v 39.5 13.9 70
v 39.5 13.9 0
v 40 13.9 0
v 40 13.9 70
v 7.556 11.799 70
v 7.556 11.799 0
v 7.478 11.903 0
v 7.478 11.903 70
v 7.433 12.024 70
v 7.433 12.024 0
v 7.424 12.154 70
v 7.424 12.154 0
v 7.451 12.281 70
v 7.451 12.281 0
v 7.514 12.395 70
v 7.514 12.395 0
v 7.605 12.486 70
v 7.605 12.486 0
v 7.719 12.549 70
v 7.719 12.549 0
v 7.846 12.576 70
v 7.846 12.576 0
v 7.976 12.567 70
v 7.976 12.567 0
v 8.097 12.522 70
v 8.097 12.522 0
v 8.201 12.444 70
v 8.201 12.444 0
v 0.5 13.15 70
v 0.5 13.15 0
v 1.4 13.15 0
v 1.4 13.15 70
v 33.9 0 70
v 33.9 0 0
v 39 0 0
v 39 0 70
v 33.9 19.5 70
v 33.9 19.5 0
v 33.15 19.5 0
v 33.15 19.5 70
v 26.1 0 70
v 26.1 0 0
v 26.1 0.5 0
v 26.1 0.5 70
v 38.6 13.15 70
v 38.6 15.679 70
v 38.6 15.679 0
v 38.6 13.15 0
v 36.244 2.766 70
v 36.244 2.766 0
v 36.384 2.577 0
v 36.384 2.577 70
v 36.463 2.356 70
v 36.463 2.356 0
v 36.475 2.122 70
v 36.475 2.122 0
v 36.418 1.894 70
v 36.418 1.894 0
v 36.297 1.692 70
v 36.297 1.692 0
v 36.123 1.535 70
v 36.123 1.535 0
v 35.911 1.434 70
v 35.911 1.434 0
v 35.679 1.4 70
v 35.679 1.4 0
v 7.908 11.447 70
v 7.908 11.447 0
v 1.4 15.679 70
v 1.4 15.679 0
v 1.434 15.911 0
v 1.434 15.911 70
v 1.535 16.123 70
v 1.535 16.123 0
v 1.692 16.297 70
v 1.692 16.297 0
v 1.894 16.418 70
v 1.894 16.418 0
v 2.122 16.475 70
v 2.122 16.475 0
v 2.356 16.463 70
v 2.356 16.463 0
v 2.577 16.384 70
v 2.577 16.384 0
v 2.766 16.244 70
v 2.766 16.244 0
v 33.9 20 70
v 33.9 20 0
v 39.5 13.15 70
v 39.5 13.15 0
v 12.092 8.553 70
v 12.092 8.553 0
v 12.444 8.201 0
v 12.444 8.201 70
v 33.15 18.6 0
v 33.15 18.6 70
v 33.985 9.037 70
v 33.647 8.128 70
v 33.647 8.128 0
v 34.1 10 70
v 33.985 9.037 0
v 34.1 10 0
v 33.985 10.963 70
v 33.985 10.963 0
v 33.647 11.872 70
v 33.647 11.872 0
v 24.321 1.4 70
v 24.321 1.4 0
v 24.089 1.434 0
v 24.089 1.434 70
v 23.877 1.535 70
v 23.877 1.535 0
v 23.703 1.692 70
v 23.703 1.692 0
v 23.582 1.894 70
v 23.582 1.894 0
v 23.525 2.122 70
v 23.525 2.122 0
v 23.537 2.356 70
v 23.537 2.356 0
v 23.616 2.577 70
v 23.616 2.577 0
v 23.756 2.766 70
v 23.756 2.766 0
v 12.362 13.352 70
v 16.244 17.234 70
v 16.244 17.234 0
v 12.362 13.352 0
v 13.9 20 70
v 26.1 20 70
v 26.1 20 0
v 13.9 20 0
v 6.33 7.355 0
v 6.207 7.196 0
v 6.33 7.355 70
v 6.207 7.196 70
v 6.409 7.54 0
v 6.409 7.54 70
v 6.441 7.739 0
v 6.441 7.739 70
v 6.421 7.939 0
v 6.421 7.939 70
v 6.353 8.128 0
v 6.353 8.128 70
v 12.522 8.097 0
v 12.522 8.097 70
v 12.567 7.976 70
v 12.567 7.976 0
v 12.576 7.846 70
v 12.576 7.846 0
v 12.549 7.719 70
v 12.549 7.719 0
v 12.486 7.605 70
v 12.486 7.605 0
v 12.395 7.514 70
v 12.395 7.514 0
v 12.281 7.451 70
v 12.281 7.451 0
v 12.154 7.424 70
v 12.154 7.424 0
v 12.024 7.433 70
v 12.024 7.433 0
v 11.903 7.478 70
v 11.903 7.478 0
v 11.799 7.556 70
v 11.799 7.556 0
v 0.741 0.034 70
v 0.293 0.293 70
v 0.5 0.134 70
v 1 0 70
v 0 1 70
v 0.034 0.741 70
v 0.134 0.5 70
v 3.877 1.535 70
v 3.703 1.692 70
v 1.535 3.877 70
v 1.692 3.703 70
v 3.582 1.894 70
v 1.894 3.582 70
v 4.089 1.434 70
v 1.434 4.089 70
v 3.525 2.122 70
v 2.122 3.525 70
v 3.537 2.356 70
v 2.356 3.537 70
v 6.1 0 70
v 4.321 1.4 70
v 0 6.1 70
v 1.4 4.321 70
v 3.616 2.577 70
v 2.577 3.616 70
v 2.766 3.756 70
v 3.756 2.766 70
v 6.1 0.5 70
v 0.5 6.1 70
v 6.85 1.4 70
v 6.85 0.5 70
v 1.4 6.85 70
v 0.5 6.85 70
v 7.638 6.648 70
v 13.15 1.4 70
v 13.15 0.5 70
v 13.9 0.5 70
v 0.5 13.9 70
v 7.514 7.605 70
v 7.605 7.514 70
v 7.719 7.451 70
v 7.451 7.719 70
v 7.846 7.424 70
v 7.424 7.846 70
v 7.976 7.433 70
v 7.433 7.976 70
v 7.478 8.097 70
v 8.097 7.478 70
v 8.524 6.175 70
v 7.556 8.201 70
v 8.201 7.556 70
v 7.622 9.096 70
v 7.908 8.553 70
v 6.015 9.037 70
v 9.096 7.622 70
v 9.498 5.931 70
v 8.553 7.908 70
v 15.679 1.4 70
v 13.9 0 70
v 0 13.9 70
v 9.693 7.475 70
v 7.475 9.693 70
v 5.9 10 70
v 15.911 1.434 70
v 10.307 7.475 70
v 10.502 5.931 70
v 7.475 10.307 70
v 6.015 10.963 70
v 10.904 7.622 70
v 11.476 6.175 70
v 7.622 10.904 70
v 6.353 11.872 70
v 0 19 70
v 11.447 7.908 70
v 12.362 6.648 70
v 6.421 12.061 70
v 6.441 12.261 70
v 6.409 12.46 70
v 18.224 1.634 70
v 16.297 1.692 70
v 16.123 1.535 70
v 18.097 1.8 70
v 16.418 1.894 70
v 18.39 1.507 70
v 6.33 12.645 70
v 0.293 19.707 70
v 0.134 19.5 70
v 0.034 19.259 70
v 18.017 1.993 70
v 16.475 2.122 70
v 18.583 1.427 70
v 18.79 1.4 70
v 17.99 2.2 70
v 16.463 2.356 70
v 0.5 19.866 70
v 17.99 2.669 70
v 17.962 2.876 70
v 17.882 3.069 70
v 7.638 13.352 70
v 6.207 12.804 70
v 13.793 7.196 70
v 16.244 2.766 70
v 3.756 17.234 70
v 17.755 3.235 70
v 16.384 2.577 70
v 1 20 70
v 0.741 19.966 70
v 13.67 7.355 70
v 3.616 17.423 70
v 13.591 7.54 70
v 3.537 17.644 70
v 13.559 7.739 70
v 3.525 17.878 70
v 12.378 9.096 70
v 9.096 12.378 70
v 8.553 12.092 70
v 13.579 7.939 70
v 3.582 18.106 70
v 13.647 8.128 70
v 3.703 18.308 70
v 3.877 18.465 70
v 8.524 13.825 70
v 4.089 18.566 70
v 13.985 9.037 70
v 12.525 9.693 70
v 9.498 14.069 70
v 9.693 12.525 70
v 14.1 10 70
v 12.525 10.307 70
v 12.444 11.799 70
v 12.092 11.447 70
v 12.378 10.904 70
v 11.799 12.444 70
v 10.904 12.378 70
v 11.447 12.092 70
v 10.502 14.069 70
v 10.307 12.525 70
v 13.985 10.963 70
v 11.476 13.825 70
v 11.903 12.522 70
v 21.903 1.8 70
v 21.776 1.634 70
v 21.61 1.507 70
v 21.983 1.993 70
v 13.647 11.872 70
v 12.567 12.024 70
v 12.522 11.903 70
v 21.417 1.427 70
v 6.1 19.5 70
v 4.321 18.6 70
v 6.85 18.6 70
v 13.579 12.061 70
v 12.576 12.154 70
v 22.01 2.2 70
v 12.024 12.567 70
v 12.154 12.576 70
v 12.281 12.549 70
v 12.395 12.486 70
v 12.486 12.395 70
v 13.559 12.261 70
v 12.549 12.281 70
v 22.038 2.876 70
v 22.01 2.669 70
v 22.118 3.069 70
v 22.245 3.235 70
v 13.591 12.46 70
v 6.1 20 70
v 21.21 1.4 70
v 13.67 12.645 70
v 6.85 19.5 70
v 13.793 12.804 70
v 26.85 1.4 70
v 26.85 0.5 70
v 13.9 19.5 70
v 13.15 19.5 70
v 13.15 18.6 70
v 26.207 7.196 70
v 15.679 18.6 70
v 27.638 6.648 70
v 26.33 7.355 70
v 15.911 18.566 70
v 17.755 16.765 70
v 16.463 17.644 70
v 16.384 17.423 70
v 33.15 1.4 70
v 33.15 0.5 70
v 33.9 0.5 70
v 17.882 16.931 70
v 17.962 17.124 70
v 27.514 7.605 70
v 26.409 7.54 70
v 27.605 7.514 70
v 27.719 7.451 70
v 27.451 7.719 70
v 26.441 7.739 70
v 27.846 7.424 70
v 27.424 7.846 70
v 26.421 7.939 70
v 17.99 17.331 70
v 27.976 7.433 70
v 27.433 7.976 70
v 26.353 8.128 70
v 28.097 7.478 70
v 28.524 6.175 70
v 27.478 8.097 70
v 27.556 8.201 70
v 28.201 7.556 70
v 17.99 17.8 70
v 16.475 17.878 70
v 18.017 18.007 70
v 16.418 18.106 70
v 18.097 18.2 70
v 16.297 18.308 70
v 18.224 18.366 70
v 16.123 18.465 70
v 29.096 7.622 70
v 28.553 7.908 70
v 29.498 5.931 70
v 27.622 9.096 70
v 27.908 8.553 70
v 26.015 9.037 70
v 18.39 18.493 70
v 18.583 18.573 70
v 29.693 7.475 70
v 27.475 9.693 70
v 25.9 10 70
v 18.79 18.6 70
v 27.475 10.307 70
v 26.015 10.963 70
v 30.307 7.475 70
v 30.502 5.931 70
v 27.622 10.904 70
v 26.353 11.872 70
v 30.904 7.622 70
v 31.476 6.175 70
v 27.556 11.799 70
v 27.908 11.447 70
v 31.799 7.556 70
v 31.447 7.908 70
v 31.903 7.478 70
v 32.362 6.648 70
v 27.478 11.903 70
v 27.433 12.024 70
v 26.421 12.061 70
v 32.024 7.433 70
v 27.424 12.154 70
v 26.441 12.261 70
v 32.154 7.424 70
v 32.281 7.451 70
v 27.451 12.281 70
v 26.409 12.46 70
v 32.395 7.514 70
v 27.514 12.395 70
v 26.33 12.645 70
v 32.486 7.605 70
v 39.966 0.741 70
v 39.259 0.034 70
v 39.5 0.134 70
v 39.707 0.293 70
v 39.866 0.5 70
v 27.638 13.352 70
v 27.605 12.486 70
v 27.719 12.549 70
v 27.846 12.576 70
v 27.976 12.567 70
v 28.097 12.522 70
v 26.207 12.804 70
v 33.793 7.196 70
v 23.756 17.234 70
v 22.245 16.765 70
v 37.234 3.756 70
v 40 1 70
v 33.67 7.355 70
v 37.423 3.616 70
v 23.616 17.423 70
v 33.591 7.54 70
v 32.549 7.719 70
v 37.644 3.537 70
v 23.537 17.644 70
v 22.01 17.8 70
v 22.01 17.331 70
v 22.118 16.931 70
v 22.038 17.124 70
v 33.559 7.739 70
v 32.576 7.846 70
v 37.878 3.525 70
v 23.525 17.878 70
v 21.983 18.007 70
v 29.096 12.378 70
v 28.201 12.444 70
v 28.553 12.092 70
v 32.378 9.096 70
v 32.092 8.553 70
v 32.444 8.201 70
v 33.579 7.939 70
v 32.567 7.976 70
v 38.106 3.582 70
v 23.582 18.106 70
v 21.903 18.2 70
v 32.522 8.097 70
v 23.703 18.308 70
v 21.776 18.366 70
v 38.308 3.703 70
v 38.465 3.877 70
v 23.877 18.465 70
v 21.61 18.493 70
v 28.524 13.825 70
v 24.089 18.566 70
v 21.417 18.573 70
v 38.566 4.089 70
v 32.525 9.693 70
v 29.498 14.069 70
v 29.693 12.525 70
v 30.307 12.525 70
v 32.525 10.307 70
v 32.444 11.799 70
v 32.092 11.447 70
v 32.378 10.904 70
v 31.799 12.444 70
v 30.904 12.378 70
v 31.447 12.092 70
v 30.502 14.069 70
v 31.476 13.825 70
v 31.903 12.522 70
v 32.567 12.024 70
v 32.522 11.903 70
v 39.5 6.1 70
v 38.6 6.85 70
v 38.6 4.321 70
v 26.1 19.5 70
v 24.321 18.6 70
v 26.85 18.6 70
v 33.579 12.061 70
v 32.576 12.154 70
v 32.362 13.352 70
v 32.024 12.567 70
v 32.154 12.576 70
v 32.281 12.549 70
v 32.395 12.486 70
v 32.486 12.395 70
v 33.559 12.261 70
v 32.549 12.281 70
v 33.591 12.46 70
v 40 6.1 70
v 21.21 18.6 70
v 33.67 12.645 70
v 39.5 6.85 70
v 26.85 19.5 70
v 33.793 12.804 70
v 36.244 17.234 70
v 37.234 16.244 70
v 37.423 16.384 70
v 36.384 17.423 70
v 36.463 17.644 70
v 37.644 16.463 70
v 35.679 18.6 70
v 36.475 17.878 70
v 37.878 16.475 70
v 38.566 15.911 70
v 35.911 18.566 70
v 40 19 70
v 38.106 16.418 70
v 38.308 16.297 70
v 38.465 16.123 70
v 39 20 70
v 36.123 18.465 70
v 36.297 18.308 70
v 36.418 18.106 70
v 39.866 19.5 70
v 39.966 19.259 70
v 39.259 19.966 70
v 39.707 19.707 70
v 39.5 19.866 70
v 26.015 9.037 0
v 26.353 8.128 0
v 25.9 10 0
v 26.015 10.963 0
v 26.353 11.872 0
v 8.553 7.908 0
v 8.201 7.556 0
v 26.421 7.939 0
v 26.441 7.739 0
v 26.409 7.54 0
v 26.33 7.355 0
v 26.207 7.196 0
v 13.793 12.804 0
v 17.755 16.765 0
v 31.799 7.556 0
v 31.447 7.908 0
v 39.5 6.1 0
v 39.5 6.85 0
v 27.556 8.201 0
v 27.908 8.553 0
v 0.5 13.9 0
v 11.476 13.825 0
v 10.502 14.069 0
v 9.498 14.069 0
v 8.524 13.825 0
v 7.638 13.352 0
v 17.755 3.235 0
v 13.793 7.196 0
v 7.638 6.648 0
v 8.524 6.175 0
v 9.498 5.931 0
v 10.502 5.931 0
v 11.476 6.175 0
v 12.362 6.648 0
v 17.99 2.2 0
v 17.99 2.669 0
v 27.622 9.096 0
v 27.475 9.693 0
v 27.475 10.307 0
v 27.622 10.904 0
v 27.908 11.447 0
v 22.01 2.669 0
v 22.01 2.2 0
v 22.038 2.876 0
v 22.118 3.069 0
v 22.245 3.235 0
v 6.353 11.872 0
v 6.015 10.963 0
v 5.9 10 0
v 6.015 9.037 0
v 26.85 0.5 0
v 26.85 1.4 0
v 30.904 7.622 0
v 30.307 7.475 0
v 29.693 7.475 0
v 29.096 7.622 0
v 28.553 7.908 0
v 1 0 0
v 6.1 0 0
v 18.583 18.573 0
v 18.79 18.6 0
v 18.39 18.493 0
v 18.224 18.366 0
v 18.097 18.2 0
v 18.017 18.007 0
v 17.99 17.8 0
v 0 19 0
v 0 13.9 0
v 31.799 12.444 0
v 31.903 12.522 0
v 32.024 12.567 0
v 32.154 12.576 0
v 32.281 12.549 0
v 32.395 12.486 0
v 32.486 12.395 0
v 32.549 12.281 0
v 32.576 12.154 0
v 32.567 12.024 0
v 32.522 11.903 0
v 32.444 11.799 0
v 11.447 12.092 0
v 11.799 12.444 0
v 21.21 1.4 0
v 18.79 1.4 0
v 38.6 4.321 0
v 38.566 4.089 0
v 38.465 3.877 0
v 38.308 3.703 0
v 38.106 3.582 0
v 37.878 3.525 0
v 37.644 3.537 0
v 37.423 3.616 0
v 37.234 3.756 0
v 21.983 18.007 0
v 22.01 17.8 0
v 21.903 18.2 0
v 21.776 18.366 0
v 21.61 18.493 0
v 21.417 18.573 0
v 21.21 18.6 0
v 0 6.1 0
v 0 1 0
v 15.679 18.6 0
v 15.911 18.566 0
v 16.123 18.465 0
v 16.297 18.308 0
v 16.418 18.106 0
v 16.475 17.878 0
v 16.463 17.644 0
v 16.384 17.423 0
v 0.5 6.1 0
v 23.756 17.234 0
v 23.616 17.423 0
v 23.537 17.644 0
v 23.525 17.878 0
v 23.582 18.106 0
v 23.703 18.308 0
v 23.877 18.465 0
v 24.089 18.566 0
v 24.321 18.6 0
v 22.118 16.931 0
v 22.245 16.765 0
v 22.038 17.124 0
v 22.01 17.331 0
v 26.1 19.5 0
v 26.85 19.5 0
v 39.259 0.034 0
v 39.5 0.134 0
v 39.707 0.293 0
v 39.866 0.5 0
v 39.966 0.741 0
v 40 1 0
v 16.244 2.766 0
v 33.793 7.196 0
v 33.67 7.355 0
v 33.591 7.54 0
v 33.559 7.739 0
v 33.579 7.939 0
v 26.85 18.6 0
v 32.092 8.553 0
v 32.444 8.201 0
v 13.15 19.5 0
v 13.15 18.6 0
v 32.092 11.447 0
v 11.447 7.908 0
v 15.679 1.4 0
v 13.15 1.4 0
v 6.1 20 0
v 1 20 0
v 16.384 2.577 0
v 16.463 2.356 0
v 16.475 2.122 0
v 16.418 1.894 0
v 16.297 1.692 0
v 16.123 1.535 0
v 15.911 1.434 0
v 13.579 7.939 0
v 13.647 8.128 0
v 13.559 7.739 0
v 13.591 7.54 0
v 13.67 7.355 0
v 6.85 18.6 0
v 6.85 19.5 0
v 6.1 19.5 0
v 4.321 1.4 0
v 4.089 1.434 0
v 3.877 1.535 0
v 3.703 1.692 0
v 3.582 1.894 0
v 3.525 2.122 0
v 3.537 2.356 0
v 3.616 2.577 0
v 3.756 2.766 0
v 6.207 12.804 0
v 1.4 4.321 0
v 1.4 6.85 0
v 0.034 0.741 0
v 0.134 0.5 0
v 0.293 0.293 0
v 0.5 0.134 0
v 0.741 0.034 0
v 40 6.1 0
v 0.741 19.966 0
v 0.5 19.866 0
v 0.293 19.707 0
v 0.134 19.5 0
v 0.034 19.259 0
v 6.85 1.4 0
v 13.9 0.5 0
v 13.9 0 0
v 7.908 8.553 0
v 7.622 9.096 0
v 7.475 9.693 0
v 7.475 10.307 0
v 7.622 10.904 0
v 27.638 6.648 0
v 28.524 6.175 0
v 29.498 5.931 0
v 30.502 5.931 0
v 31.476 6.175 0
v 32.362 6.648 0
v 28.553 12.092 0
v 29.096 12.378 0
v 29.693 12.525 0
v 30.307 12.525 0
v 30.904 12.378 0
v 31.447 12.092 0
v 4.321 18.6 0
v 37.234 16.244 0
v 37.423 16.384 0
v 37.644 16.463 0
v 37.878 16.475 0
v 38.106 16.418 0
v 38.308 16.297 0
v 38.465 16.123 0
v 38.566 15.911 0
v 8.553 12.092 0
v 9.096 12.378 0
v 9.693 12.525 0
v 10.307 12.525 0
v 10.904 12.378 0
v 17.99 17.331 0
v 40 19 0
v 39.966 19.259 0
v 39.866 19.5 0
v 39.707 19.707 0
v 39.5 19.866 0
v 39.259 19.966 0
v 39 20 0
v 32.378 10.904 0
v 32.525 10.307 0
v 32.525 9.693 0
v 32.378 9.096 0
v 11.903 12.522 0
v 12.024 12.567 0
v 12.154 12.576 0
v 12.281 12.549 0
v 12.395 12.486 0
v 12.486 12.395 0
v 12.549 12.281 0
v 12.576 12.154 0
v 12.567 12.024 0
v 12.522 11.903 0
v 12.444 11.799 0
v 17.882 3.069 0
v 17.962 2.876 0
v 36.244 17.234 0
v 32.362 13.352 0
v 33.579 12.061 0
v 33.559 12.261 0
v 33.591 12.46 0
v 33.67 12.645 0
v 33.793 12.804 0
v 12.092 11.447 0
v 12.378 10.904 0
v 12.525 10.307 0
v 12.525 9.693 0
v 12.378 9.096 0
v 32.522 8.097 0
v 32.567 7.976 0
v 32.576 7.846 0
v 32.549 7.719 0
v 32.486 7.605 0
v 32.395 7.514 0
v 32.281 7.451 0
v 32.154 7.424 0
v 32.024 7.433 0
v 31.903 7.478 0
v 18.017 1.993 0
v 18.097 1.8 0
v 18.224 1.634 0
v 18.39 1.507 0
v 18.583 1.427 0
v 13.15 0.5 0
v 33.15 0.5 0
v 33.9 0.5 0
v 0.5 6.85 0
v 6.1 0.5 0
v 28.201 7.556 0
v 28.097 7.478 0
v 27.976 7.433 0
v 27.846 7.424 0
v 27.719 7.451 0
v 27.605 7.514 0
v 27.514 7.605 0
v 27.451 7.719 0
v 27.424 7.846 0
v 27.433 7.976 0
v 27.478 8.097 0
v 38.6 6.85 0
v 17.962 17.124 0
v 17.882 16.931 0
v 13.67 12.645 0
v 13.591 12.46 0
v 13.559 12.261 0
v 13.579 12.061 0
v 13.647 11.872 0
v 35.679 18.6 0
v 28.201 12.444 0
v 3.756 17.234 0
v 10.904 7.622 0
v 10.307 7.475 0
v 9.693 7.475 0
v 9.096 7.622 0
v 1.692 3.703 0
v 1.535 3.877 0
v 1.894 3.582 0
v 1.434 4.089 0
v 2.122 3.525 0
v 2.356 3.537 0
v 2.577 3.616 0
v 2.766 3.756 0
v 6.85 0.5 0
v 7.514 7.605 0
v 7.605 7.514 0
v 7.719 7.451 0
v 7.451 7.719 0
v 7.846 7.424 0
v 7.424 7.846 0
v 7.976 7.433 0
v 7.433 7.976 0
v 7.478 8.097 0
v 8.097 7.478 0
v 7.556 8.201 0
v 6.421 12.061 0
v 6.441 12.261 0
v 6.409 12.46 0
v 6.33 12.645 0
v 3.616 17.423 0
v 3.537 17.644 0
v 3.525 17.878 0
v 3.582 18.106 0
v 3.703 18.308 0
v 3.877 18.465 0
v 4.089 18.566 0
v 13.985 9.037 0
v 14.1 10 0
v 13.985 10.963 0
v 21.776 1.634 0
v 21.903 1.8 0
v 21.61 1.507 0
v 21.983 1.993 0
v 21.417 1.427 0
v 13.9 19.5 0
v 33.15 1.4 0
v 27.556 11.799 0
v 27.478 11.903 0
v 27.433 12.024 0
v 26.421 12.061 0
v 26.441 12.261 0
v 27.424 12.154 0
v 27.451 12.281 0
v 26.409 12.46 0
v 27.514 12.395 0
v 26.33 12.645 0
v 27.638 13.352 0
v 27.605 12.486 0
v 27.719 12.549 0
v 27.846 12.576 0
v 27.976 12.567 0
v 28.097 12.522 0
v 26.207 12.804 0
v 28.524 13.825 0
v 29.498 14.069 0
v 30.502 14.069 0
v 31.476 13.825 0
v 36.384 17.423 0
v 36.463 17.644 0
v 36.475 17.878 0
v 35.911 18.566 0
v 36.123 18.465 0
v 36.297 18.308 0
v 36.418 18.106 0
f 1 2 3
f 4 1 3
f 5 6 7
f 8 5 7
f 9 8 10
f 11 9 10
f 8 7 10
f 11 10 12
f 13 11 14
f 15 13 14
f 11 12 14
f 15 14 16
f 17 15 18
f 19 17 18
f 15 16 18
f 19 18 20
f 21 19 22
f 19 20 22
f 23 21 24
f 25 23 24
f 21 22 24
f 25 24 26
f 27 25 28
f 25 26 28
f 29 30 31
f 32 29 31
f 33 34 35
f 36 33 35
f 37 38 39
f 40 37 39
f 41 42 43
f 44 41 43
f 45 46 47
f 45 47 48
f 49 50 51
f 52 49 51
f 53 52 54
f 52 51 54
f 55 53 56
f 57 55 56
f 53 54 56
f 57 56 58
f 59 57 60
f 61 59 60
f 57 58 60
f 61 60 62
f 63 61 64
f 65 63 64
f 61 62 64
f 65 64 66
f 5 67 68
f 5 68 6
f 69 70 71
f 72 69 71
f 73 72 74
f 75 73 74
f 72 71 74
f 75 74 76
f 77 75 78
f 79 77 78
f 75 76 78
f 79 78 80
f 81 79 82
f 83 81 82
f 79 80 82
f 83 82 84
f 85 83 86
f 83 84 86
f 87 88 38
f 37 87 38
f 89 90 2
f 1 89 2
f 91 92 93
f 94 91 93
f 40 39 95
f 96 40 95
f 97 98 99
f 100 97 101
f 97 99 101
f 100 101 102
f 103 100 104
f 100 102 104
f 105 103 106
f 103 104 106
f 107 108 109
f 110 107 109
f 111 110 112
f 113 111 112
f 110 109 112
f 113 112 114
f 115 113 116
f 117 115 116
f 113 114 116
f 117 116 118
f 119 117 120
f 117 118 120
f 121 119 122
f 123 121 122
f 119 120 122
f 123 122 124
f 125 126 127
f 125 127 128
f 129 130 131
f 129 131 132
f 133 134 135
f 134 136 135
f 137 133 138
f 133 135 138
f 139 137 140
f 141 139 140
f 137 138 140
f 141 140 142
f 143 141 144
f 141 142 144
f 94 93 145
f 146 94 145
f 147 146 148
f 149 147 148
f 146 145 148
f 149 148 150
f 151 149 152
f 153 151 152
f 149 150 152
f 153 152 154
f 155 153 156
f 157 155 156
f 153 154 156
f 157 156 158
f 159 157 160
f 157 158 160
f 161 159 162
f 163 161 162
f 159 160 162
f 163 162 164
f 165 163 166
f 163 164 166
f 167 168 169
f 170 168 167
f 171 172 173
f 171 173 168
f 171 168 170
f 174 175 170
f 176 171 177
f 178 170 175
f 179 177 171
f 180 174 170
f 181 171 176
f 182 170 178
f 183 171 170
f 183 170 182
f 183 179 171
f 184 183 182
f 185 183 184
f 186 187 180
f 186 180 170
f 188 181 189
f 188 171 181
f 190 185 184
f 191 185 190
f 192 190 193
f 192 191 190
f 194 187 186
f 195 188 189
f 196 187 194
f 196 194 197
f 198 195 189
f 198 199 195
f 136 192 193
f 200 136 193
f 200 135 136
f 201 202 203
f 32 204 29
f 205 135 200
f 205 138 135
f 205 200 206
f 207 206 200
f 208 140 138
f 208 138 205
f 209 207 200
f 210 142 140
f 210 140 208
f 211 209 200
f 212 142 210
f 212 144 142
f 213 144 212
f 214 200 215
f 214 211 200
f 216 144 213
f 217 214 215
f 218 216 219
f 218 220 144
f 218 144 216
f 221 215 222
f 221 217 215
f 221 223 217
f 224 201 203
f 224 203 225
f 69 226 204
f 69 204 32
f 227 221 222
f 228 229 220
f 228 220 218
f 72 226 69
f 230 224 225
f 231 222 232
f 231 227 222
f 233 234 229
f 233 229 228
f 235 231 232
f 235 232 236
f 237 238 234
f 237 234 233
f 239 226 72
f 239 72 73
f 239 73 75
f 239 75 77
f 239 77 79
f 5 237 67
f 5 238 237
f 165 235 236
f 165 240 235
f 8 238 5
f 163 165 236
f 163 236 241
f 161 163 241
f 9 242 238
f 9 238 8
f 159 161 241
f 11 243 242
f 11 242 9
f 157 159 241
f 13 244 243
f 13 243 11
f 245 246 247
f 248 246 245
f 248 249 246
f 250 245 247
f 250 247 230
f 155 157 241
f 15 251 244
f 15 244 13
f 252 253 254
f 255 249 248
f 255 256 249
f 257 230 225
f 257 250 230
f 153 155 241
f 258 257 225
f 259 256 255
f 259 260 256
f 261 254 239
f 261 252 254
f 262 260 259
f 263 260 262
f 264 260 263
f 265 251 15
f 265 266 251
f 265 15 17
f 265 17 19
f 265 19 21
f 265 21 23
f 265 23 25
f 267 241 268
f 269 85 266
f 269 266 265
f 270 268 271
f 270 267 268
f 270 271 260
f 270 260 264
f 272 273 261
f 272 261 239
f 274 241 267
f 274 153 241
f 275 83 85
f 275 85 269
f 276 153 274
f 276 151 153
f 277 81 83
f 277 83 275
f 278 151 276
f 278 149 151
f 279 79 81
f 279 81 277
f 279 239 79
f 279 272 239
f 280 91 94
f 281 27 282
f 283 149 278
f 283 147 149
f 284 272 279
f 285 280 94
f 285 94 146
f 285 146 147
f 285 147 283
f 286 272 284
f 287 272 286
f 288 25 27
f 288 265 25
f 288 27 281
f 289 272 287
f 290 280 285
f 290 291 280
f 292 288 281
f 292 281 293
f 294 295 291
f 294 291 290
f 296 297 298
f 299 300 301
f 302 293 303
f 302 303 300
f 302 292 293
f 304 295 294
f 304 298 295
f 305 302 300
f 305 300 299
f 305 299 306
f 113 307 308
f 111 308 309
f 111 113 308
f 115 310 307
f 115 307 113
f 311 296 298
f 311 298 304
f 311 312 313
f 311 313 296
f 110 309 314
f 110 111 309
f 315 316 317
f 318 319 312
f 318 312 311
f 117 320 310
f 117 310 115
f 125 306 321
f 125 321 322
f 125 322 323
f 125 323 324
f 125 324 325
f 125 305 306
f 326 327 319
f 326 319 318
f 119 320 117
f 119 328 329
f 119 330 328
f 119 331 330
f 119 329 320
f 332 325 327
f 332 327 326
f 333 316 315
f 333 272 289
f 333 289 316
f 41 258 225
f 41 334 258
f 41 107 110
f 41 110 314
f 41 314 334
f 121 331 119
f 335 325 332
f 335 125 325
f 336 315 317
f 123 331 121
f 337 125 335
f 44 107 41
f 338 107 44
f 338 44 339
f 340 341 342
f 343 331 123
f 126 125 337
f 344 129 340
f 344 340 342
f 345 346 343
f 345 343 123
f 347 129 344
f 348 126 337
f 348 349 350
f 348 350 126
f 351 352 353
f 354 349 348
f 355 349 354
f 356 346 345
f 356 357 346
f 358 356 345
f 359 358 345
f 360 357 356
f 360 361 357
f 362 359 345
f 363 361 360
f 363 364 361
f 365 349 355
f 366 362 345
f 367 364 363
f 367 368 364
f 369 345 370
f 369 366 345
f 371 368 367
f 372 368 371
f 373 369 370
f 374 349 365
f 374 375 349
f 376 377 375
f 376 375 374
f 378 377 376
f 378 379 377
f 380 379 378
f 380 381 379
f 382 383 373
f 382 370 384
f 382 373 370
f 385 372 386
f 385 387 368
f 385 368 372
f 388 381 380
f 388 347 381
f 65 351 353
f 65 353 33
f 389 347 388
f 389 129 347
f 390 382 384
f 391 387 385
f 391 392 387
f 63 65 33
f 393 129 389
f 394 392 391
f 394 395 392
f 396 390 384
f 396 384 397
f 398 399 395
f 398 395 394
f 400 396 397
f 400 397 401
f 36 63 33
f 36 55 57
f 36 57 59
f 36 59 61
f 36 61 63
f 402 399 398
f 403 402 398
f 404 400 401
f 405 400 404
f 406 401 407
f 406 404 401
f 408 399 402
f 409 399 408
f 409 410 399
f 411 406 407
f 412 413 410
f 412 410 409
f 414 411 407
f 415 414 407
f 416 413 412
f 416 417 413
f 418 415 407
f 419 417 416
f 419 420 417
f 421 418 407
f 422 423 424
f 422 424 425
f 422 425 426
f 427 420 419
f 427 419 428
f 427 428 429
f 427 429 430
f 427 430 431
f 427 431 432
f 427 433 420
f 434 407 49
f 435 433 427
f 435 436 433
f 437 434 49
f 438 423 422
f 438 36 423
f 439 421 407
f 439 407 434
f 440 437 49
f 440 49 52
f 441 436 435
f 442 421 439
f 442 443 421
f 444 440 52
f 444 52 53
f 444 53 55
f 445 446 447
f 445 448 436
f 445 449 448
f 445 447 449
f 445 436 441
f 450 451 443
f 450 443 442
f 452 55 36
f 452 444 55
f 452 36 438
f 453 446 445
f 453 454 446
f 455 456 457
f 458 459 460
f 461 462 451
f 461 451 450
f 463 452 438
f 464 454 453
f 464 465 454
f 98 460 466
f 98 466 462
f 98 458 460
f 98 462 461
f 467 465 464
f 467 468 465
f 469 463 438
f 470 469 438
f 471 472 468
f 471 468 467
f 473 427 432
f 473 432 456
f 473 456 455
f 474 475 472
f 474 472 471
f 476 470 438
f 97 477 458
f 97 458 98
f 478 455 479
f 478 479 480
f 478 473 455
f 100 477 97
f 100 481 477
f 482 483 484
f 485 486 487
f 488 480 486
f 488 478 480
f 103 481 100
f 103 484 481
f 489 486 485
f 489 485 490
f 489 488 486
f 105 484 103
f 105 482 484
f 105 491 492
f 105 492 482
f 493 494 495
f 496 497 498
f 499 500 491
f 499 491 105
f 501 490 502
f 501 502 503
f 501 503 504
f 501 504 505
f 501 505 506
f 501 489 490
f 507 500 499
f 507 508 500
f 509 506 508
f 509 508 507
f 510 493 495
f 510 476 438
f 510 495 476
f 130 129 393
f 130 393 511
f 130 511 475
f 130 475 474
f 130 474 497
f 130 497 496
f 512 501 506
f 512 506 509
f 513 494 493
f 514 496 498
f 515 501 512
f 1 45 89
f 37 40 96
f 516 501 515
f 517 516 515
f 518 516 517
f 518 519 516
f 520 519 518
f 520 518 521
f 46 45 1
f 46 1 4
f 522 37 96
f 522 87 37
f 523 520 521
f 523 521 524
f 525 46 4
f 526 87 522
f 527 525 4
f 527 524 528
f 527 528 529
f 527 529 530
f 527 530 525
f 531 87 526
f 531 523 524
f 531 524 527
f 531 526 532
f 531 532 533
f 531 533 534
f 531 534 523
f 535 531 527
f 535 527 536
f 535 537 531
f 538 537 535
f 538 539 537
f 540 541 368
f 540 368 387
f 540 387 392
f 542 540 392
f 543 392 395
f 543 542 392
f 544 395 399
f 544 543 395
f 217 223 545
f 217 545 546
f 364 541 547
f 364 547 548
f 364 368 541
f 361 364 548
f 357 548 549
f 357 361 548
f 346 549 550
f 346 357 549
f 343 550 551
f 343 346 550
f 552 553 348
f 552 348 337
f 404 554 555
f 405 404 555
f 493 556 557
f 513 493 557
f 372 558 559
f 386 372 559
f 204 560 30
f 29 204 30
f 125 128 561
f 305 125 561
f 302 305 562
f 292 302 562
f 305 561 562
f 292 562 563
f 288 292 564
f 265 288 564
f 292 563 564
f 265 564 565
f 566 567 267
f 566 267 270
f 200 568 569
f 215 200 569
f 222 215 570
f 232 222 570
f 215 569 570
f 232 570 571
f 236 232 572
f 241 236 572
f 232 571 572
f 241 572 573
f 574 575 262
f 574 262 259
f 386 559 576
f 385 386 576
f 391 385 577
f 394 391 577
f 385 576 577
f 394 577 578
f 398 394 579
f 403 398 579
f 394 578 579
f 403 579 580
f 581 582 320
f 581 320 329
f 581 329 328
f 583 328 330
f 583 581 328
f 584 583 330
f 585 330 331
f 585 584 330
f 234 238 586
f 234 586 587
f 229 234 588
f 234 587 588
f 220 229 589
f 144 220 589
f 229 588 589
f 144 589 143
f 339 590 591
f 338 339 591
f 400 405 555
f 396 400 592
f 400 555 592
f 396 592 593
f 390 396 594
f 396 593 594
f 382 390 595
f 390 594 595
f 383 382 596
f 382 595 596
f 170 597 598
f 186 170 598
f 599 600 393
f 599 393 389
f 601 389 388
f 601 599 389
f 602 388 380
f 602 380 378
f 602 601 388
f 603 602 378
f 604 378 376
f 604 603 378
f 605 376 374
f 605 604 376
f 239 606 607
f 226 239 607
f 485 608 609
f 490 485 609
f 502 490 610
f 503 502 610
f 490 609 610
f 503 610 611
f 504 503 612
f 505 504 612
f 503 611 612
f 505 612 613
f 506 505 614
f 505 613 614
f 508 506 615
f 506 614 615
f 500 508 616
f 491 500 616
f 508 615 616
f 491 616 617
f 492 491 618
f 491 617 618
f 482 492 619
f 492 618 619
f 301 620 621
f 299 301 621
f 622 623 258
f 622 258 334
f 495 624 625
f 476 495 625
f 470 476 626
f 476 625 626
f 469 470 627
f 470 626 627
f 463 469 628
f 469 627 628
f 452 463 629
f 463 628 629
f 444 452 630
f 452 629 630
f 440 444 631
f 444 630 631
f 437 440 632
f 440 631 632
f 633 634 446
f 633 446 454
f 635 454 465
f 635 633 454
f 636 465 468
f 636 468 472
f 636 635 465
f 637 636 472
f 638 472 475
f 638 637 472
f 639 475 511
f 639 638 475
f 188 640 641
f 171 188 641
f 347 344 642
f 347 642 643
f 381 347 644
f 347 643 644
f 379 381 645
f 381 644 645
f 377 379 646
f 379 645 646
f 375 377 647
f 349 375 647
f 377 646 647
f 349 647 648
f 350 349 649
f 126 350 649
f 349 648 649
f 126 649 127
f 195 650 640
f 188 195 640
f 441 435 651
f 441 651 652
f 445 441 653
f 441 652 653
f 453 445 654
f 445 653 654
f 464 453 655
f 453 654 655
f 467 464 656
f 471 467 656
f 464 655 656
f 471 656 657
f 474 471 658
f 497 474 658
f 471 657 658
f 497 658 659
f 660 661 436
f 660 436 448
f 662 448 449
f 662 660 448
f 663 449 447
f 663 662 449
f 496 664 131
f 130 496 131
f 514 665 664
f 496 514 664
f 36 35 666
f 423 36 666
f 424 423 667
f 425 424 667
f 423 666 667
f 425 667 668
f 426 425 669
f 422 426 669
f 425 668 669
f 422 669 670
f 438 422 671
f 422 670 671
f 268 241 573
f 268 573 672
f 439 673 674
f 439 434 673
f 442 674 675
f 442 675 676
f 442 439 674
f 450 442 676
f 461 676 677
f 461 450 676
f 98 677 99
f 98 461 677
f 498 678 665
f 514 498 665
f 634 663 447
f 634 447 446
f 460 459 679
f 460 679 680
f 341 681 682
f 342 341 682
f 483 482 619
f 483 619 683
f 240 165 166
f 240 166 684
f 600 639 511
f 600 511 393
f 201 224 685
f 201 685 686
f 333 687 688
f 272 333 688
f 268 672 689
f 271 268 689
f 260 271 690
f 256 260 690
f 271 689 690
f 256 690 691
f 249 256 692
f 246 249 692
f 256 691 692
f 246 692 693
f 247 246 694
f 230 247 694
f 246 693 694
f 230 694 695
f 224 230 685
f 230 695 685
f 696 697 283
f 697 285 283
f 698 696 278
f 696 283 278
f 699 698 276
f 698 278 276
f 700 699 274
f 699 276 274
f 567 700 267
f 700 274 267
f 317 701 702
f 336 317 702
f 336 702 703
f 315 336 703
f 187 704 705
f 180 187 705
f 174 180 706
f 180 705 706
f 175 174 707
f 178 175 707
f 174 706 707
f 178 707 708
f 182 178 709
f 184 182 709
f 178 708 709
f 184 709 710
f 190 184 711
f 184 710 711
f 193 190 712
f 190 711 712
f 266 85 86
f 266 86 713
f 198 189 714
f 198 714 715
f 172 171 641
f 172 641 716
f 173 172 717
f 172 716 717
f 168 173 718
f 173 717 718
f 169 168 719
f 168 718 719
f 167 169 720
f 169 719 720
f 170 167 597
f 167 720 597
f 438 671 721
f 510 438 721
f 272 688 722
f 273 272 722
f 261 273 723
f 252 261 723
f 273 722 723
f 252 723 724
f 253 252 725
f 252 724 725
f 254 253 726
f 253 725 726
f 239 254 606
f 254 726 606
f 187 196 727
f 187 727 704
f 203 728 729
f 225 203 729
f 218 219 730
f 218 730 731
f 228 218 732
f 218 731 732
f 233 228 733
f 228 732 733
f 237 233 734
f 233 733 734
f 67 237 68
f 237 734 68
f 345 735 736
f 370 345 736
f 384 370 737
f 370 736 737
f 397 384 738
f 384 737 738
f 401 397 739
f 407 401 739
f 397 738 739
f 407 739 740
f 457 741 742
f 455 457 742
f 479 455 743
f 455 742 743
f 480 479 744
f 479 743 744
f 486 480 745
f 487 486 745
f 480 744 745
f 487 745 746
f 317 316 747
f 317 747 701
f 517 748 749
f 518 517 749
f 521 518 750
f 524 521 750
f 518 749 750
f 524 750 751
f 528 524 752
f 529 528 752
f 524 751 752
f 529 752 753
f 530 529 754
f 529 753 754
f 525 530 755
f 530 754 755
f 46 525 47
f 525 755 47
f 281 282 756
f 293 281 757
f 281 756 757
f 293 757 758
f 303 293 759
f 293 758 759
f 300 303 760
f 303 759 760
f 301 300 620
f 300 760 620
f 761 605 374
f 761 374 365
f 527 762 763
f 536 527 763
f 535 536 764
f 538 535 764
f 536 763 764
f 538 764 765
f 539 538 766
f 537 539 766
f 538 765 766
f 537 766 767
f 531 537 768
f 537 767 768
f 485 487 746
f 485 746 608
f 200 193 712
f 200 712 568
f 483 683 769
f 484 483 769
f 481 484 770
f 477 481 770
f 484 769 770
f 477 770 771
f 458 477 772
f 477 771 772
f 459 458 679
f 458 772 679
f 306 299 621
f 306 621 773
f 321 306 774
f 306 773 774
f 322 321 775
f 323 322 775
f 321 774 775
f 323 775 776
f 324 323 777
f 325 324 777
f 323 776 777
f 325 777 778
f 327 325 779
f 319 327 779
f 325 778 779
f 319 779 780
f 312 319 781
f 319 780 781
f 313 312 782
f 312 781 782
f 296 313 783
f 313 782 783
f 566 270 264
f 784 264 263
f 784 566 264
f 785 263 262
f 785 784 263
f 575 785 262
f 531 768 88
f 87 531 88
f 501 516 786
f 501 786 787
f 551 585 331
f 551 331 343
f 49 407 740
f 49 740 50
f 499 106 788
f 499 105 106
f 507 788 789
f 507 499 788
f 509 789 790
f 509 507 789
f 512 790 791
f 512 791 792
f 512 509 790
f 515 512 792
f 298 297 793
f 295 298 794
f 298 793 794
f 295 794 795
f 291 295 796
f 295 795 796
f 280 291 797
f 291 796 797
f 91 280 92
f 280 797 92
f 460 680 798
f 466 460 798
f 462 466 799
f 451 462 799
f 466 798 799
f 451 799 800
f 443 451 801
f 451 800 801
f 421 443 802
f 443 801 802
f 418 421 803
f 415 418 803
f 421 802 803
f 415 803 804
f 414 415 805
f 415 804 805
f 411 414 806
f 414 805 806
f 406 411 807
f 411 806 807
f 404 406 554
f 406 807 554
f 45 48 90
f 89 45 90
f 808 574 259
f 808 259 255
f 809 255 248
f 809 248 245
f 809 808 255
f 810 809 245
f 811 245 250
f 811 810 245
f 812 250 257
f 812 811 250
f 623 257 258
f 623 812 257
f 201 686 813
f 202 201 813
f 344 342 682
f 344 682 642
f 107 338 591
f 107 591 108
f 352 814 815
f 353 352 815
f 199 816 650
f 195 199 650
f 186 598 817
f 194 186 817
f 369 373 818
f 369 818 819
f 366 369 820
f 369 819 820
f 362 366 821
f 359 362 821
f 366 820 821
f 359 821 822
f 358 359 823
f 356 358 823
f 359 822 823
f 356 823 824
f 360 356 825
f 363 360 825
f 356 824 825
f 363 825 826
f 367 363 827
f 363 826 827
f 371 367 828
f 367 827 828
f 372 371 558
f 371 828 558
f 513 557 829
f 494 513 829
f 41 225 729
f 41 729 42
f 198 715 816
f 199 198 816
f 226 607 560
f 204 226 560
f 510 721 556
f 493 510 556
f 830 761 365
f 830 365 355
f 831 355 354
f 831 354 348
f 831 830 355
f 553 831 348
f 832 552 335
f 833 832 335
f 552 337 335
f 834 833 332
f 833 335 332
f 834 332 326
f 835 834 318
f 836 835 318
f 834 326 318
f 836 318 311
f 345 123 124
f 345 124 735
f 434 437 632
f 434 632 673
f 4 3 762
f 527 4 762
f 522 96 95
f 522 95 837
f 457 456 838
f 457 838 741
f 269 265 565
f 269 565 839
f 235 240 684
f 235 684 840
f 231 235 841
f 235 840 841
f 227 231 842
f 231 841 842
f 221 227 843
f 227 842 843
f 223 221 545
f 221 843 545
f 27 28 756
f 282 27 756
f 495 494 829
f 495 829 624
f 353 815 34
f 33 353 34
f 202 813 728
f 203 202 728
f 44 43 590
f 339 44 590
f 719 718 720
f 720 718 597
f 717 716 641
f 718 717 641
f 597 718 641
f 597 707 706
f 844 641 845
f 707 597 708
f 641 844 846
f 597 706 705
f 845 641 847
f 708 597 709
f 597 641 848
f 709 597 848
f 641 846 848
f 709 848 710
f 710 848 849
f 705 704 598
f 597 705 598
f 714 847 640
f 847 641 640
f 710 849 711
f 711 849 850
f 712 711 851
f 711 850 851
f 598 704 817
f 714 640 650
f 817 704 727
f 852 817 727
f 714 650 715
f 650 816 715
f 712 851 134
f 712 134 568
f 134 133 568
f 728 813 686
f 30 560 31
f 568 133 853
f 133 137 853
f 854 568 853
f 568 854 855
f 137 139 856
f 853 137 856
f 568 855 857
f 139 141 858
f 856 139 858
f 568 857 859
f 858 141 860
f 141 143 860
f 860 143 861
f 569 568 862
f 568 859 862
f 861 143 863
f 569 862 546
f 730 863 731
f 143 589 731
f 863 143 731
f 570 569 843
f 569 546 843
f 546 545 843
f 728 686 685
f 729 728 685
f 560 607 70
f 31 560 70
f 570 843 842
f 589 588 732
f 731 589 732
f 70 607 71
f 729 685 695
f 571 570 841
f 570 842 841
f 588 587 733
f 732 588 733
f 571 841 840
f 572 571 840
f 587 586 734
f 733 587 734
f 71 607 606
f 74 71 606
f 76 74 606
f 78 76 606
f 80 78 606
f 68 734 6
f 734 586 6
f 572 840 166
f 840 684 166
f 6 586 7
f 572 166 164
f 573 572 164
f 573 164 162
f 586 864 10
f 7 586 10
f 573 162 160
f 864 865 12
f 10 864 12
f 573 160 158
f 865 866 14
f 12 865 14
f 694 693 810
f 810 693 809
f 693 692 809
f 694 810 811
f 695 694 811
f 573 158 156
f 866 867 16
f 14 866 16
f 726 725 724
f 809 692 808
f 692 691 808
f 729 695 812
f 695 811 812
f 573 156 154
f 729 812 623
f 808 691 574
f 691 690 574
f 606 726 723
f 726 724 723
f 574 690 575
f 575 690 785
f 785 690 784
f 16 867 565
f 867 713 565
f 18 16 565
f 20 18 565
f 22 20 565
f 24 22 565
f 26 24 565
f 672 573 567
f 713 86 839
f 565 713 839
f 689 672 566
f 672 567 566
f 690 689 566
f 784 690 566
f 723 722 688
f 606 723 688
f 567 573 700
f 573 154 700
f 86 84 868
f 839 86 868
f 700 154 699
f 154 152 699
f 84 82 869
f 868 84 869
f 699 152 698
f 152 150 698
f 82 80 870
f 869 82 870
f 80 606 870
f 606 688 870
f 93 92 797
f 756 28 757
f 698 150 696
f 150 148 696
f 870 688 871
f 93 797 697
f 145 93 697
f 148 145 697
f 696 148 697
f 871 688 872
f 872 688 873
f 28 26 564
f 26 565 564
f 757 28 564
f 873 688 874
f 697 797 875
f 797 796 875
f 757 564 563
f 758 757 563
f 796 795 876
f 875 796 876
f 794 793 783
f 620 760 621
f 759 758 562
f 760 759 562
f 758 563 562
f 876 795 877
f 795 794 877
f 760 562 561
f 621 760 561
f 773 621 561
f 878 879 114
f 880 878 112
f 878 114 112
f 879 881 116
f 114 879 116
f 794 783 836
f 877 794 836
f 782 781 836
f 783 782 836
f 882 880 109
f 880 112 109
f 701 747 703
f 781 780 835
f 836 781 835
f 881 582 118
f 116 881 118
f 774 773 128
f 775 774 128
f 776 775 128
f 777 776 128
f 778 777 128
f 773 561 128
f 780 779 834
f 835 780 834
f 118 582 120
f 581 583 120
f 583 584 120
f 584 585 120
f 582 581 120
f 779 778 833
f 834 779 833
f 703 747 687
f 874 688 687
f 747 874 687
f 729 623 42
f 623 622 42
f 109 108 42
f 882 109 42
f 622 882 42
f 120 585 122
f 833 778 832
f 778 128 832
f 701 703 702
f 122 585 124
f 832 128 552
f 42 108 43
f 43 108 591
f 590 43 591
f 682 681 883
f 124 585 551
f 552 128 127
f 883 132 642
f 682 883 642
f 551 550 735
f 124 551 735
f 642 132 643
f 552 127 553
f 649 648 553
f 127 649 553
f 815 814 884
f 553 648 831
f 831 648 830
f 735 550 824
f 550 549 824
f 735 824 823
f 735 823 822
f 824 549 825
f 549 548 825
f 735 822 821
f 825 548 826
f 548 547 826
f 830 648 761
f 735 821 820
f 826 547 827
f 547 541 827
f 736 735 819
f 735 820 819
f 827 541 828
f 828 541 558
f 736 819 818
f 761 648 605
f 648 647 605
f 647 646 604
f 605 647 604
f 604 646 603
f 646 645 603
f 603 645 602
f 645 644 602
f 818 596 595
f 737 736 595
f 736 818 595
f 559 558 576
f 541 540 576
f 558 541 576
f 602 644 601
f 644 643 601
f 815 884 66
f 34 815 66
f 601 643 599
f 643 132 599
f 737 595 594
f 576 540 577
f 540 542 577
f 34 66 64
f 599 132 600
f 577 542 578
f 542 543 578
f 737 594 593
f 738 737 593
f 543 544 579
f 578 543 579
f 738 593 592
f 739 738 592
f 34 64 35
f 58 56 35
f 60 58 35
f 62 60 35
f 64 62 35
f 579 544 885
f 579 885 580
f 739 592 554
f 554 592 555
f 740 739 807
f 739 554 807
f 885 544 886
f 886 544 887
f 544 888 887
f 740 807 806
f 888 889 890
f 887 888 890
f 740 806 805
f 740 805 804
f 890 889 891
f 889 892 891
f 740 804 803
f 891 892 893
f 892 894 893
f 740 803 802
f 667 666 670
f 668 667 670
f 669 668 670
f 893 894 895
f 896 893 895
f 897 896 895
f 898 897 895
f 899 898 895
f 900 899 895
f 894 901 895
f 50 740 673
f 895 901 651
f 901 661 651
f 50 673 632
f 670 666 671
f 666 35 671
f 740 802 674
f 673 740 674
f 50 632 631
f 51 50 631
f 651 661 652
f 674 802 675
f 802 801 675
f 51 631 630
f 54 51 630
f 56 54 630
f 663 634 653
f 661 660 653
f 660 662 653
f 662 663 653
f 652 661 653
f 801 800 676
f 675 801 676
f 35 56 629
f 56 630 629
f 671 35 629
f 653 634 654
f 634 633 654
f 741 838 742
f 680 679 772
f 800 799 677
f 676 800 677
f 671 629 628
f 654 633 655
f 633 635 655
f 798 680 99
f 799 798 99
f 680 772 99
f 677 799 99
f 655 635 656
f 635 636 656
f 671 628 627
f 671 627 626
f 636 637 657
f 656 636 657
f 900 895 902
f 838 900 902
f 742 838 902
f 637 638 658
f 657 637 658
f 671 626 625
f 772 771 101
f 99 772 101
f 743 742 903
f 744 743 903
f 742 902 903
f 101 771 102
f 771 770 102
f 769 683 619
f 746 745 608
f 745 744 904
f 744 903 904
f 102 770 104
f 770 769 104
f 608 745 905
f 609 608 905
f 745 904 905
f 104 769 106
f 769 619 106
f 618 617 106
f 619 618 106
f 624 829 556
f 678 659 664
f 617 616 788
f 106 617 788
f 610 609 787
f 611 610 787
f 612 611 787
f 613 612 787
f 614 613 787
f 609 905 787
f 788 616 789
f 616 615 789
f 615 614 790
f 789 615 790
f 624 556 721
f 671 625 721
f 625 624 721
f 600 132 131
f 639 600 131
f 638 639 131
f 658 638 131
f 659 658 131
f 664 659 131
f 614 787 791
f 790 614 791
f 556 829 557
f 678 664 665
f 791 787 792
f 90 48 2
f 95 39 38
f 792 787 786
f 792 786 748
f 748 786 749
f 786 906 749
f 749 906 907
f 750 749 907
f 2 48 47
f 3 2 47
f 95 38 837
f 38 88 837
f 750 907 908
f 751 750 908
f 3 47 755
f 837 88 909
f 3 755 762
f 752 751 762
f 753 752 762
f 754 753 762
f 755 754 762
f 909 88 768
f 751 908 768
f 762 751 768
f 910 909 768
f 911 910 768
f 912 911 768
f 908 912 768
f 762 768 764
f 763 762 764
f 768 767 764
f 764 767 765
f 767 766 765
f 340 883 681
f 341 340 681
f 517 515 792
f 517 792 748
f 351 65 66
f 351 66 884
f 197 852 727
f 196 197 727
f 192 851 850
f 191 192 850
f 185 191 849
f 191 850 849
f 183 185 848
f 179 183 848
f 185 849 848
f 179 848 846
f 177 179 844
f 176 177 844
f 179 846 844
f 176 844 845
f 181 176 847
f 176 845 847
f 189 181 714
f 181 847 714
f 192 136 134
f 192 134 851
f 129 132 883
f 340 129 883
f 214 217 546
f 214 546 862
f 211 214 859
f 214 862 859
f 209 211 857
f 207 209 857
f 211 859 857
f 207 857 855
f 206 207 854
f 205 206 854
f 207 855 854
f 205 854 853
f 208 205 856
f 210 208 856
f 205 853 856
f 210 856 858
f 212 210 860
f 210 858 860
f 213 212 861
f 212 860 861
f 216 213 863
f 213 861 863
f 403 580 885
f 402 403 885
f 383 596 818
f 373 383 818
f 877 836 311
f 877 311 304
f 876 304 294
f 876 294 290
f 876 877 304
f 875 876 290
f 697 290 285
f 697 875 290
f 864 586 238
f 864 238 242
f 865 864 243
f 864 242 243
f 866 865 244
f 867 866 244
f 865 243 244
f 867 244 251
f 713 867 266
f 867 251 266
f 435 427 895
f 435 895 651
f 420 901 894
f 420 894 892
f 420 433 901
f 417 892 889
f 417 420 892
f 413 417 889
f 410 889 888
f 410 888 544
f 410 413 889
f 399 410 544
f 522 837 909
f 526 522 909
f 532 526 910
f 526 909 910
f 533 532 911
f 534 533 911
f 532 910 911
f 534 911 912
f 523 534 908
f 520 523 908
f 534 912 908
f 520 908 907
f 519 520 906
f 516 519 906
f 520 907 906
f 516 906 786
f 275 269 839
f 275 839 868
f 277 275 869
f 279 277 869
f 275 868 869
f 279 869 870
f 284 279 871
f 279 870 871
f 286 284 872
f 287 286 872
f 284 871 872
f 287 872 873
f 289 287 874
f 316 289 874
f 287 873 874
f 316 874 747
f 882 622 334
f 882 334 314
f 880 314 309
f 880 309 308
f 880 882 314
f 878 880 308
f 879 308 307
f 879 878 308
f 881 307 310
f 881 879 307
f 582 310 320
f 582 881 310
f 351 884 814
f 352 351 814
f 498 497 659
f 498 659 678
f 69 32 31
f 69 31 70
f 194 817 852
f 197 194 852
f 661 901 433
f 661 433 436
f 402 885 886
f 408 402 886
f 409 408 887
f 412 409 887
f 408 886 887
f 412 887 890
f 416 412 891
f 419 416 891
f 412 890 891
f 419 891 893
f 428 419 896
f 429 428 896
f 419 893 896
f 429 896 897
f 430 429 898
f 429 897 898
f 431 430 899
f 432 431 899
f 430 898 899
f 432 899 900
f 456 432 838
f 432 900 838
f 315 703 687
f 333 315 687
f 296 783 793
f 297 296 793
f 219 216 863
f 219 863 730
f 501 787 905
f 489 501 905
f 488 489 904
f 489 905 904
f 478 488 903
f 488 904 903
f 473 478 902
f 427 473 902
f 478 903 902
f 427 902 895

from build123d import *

# Parameters (mm, degrees)
Y_KSEKLIK_EKSTR_ZYON2_DEPTH = 70
RADYUS1_R                   = 0.8


with BuildPart() as part:
    # Çizim3 → Yükseklik-Ekstrüzyon2 (new body)
    with BuildSketch(Plane.XY):
        with BuildLine():
            Line((1, 0), (6.1, 0))
            Line((6.1, 0), (6.1, 0.5))
            Line((6.1, 0.5), (6.85, 0.5))
            Line((6.85, 0.5), (6.85, 1.4))
            Line((6.85, 1.4), (4.321320344, 1.4))
            ThreePointArc((4.321320344, 1.4), (3.582216718, 1.893853254), (3.755634919, 2.765685425))
            Line((3.755634919, 2.765685425), (7.638403375, 6.648453882))
            ThreePointArc((7.638403375, 6.648453882), (10, 5.9), (12.361596625, 6.648453882))
            Line((12.361596625, 6.648453882), (16.244365081, 2.765685425))
            ThreePointArc((16.244365081, 2.765685425), (16.417783282, 1.893853254), (15.678679656, 1.4))
            Line((15.678679656, 1.4), (13.15, 1.4))
            Line((13.15, 1.4), (13.15, 0.5))
            Line((13.15, 0.5), (13.9, 0.5))
            Line((13.9, 0.5), (13.9, 0))
            Line((13.9, 0), (26.1, 0))
            Line((26.1, 0), (26.1, 0.5))
            Line((26.1, 0.5), (26.85, 0.5))
            Line((26.85, 0.5), (26.85, 1.4))
            Line((26.85, 1.4), (24.321320344, 1.4))
            ThreePointArc((24.321320344, 1.4), (23.582216718, 1.893853254), (23.755634919, 2.765685425))
            Line((23.755634919, 2.765685425), (27.638403375, 6.648453882))
            ThreePointArc((27.638403375, 6.648453882), (30, 5.9), (32.361596625, 6.648453882))
            Line((32.361596625, 6.648453882), (36.244365081, 2.765685425))
            ThreePointArc((36.244365081, 2.765685425), (36.417783282, 1.893853254), (35.678679656, 1.4))
            Line((35.678679656, 1.4), (33.15, 1.4))
            Line((33.15, 1.4), (33.15, 0.5))
            Line((33.15, 0.5), (33.9, 0.5))
            Line((33.9, 0.5), (33.9, 0))
            Line((33.9, 0), (39, 0))
            ThreePointArc((39, 0), (39.707106781, 0.292893219), (40, 1))
            Line((40, 1), (40, 6.1))
            Line((40, 6.1), (39.5, 6.1))
            Line((39.5, 6.1), (39.5, 6.85))
            Line((39.5, 6.85), (38.6, 6.85))
            Line((38.6, 6.85), (38.6, 4.321320344))
            ThreePointArc((38.6, 4.321320344), (38.106146746, 3.582216718), (37.234314575, 3.755634919))
            Line((37.234314575, 3.755634919), (33.351546118, 7.638403375))
            ThreePointArc((33.351546118, 7.638403375), (34.1, 10), (33.351546118, 12.361596625))
            Line((33.351546118, 12.361596625), (37.234314575, 16.244365081))
            ThreePointArc((37.234314575, 16.244365081), (38.106146746, 16.417783282), (38.6, 15.678679656))
            Line((38.6, 15.678679656), (38.6, 13.15))
            Line((38.6, 13.15), (39.5, 13.15))
            Line((39.5, 13.15), (39.5, 13.9))
            Line((39.5, 13.9), (40, 13.9))
            Line((40, 13.9), (40, 19))
            ThreePointArc((40, 19), (39.707106781, 19.707106781), (39, 20))
            Line((39, 20), (33.9, 20))
            Line((33.9, 20), (33.9, 19.5))
            Line((33.9, 19.5), (33.15, 19.5))
            Line((33.15, 19.5), (33.15, 18.6))
            Line((33.15, 18.6), (35.678679656, 18.6))
            ThreePointArc((35.678679656, 18.6), (36.417783282, 18.106146746), (36.244365081, 17.234314575))
            Line((36.244365081, 17.234314575), (32.361596625, 13.351546118))
            ThreePointArc((32.361596625, 13.351546118), (30, 14.1), (27.638403375, 13.351546118))
            Line((27.638403375, 13.351546118), (23.755634919, 17.234314575))
            ThreePointArc((23.755634919, 17.234314575), (23.582216718, 18.106146746), (24.321320344, 18.6))
            Line((24.321320344, 18.6), (26.85, 18.6))
            Line((26.85, 18.6), (26.85, 19.5))
            Line((26.85, 19.5), (26.1, 19.5))
            Line((26.1, 19.5), (26.1, 20))
            Line((26.1, 20), (13.9, 20))
            Line((13.9, 20), (13.9, 19.5))
            Line((13.9, 19.5), (13.15, 19.5))
            Line((13.15, 19.5), (13.15, 18.6))
            Line((13.15, 18.6), (15.678679656, 18.6))
            ThreePointArc((15.678679656, 18.6), (16.417783282, 18.106146746), (16.244365081, 17.234314575))
            Line((16.244365081, 17.234314575), (12.361596625, 13.351546118))
            ThreePointArc((12.361596625, 13.351546118), (10, 14.1), (7.638403375, 13.351546118))
            Line((7.638403375, 13.351546118), (3.755634919, 17.234314575))
            ThreePointArc((3.755634919, 17.234314575), (3.582216718, 18.106146746), (4.321320344, 18.6))
            Line((4.321320344, 18.6), (6.85, 18.6))
            Line((6.85, 18.6), (6.85, 19.5))
            Line((6.85, 19.5), (6.1, 19.5))
            Line((6.1, 19.5), (6.1, 20))
            Line((6.1, 20), (1, 20))
            ThreePointArc((1, 20), (0.292893219, 19.707106781), (0, 19))
            Line((0, 19), (0, 13.9))
            Line((0, 13.9), (0.5, 13.9))
            Line((0.5, 13.9), (0.5, 13.15))
            Line((0.5, 13.15), (1.4, 13.15))
            Line((1.4, 13.15), (1.4, 15.678679656))
            ThreePointArc((1.4, 15.678679656), (1.893853254, 16.417783282), (2.765685425, 16.244365081))
            Line((2.765685425, 16.244365081), (6.648453882, 12.361596625))
            ThreePointArc((6.648453882, 12.361596625), (5.9, 10), (6.648453882, 7.638403375))
            Line((6.648453882, 7.638403375), (2.765685425, 3.755634919))
            ThreePointArc((2.765685425, 3.755634919), (1.893853254, 3.582216718), (1.4, 4.321320344))
            Line((1.4, 4.321320344), (1.4, 6.85))
            Line((1.4, 6.85), (0.5, 6.85))
            Line((0.5, 6.85), (0.5, 6.1))
            Line((0.5, 6.1), (0, 6.1))
            Line((0, 6.1), (0, 1))
            ThreePointArc((0, 1), (0.292893219, 0.292893219), (1, 0))
        make_face()
        with BuildLine():
            Line((21.210320913, 18.6), (18.789679087, 18.6))
            ThreePointArc((18.789679087, 18.6), (18.223993662, 18.365685425), (17.989679087, 17.8))
            Line((17.989679087, 17.8), (17.989679087, 17.331100443))
            ThreePointArc((17.989679087, 17.331100443), (17.928782713, 17.024953697), (17.755364512, 16.765415018))
            Line((17.755364512, 16.765415018), (13.351546118, 12.361596625))
            ThreePointArc((13.351546118, 12.361596625), (14.1, 10), (13.351546118, 7.638403375))
            Line((13.351546118, 7.638403375), (17.755364512, 3.234584982))
            ThreePointArc((17.755364512, 3.234584982), (17.928782713, 2.975046303), (17.989679087, 2.668899557))
            Line((17.989679087, 2.668899557), (17.989679087, 2.2))
            ThreePointArc((17.989679087, 2.2), (18.223993662, 1.634314575), (18.789679087, 1.4))
            Line((18.789679087, 1.4), (21.210320913, 1.4))
            ThreePointArc((21.210320913, 1.4), (21.776006338, 1.634314575), (22.010320913, 2.2))
            Line((22.010320913, 2.2), (22.010320913, 2.668899557))
            ThreePointArc((22.010320913, 2.668899557), (22.071217287, 2.975046303), (22.244635488, 3.234584982))
            Line((22.244635488, 3.234584982), (26.648453882, 7.638403375))
            ThreePointArc((26.648453882, 7.638403375), (25.9, 10), (26.648453882, 12.361596625))
            Line((26.648453882, 12.361596625), (22.244635488, 16.765415018))
            ThreePointArc((22.244635488, 16.765415018), (22.071217287, 17.024953697), (22.010320913, 17.331100443))
            Line((22.010320913, 17.331100443), (22.010320913, 17.8))
            ThreePointArc((22.010320913, 17.8), (21.776006338, 18.365685425), (21.210320913, 18.6))
        make_face(mode=Mode.SUBTRACT)
        with BuildLine():
            Line((8.201142588, 12.443783276), (8.552743846, 12.092182018))
            ThreePointArc((8.552743846, 12.092182018), (10, 12.543968548), (11.447256154, 12.092182018))
            Line((11.447256154, 12.092182018), (11.798857412, 12.443783276))
            ThreePointArc((11.798857412, 12.443783276), (12.443783276, 12.443783276), (12.443783276, 11.798857412))
            Line((12.443783276, 11.798857412), (12.092182018, 11.447256154))
            ThreePointArc((12.092182018, 11.447256154), (12.543968548, 10), (12.092182018, 8.552743846))
            Line((12.092182018, 8.552743846), (12.443783276, 8.201142588))
            ThreePointArc((12.443783276, 8.201142588), (12.443783276, 7.556216724), (11.798857412, 7.556216724))
            Line((11.798857412, 7.556216724), (11.447256154, 7.907817982))
            ThreePointArc((11.447256154, 7.907817982), (10, 7.456031452), (8.552743846, 7.907817982))
            Line((8.552743846, 7.907817982), (8.201142588, 7.556216724))
            ThreePointArc((8.201142588, 7.556216724), (7.556216724, 7.556216724), (7.556216724, 8.201142588))
            Line((7.556216724, 8.201142588), (7.907817982, 8.552743846))
            ThreePointArc((7.907817982, 8.552743846), (7.456031452, 10), (7.907817982, 11.447256154))
            Line((7.907817982, 11.447256154), (7.556216724, 11.798857412))
            ThreePointArc((7.556216724, 11.798857412), (7.556216724, 12.443783276), (8.201142588, 12.443783276))
        make_face(mode=Mode.SUBTRACT)
        with BuildLine():
            Line((27.907817982, 11.447256154), (27.556216724, 11.798857412))
            ThreePointArc((27.556216724, 11.798857412), (27.556216724, 12.443783276), (28.201142588, 12.443783276))
            Line((28.201142588, 12.443783276), (28.552743846, 12.092182018))
            ThreePointArc((28.552743846, 12.092182018), (30, 12.543968548), (31.447256154, 12.092182018))
            Line((31.447256154, 12.092182018), (31.798857412, 12.443783276))
            ThreePointArc((31.798857412, 12.443783276), (32.443783276, 12.443783276), (32.443783276, 11.798857412))
            Line((32.443783276, 11.798857412), (32.092182018, 11.447256154))
            ThreePointArc((32.092182018, 11.447256154), (32.543968548, 10), (32.092182018, 8.552743846))
            Line((32.092182018, 8.552743846), (32.443783276, 8.201142588))
            ThreePointArc((32.443783276, 8.201142588), (32.443783276, 7.556216724), (31.798857412, 7.556216724))
            Line((31.798857412, 7.556216724), (31.447256154, 7.907817982))
            ThreePointArc((31.447256154, 7.907817982), (30, 7.456031452), (28.552743846, 7.907817982))
            Line((28.552743846, 7.907817982), (28.201142588, 7.556216724))
            ThreePointArc((28.201142588, 7.556216724), (27.556216724, 7.556216724), (27.556216724, 8.201142588))
            Line((27.556216724, 8.201142588), (27.907817982, 8.552743846))
            ThreePointArc((27.907817982, 8.552743846), (27.456031452, 10), (27.907817982, 11.447256154))
        make_face(mode=Mode.SUBTRACT)
    extrude(amount=Y_KSEKLIK_EKSTR_ZYON2_DEPTH)

    # Radyus1
    radyus1_edges = [part.edges().sort_by_distance(p)[0] for p in [
        (6.648453882, 7.638403375, 35),
        (6.648453882, 12.361596625, 35),
        (33.351546118, 12.361596625, 35),
        (33.351546118, 7.638403375, 35),
        (13.351546118, 12.361596625, 35),
        (13.351546118, 7.638403375, 35),
        (26.648453882, 7.638403375, 35),
        (26.648453882, 12.361596625, 35),
    ]]
    fillet(radyus1_edges, radius=RADYUS1_R)


solid = part.part
